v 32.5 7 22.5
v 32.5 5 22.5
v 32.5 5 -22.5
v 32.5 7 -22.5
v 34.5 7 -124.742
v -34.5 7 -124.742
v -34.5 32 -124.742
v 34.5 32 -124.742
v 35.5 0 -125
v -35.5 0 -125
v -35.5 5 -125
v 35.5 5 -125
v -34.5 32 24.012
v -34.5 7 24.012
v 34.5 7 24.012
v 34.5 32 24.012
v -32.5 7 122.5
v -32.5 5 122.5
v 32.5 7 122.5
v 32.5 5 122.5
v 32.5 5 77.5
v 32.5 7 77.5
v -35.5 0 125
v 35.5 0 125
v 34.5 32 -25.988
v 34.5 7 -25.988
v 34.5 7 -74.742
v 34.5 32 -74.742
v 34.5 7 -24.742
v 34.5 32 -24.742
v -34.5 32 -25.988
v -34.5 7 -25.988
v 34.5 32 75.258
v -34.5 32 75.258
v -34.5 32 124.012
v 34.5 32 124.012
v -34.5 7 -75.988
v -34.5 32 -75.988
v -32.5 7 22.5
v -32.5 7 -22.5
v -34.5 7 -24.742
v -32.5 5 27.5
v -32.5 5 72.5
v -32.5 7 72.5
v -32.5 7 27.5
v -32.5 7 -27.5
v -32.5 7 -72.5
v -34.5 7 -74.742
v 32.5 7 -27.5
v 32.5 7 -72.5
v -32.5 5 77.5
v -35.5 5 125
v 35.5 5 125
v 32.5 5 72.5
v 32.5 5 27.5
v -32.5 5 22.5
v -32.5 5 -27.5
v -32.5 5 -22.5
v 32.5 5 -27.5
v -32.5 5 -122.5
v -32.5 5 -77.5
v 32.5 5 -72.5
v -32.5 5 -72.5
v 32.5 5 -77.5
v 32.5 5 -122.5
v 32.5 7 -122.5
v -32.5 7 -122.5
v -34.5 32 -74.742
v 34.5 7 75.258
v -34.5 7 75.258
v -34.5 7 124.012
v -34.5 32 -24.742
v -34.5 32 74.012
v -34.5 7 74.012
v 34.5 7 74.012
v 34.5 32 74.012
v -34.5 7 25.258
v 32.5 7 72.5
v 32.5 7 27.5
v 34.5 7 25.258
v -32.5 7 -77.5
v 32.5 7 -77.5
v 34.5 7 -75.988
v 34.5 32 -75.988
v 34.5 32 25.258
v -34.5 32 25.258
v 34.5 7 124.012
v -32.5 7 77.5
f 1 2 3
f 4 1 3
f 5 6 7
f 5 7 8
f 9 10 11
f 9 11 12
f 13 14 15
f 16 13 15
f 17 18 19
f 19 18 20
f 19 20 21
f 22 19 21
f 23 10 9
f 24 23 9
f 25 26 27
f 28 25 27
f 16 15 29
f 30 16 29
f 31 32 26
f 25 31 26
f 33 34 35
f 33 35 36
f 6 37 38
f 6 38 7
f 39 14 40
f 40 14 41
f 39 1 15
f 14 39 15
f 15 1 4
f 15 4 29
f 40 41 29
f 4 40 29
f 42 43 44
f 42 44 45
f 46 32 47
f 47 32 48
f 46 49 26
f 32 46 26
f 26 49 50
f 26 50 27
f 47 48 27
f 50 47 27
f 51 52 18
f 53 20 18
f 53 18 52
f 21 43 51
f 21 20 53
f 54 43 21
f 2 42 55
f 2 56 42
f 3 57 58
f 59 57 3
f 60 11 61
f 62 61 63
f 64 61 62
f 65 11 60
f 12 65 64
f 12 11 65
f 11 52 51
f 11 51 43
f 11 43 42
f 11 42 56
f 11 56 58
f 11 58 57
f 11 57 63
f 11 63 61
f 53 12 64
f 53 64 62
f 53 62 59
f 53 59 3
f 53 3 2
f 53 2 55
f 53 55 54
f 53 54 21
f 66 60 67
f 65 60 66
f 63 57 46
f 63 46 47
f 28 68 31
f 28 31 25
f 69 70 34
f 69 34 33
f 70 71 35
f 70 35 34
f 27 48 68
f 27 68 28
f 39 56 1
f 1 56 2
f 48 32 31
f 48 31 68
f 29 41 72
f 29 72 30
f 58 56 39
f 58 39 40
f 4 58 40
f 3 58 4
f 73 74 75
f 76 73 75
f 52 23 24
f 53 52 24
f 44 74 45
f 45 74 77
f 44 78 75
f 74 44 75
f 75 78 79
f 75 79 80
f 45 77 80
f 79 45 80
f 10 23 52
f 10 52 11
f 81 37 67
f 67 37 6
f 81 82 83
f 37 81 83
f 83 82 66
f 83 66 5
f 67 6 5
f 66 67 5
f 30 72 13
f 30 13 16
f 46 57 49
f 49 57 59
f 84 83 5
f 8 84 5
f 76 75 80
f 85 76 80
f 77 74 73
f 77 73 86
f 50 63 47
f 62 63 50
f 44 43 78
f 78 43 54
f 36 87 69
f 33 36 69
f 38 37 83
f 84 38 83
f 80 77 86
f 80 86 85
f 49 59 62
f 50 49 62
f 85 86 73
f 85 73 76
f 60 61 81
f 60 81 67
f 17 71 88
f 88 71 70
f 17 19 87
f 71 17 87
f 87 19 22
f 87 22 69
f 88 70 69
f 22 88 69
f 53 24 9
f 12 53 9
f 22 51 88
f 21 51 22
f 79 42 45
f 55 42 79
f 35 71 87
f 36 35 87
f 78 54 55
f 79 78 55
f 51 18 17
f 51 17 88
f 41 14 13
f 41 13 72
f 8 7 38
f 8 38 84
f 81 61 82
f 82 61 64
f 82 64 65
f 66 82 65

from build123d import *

# Parameters (mm, degrees)
SKETCH1_W           = 71
SKETCH1_H           = 250
BOSS_EXTRUDE1_DEPTH = 5
SKETCH2_W           = 65
SKETCH2_H           = 45
BOSS_EXTRUDE3_DEPTH = 2
LPATTERN1_COUNT     = 5
LPATTERN1_PITCH     = 50
SKETCH3_W           = 69
SKETCH3_H           = 48.754858224
BOSS_EXTRUDE8_DEPTH = 25
LPATTERN5_COUNT     = 5
LPATTERN5_PITCH     = 50


with BuildPart() as part:
    # Sketch1 → Boss-Extrude1 (new body)
    with BuildSketch(Plane(origin=(0, 0, 0), x_dir=(1, 0, 0), z_dir=(0, 1, 0))):
        Rectangle(SKETCH1_W, SKETCH1_H)
    extrude(amount=BOSS_EXTRUDE1_DEPTH)

    # Sketch2 → Boss-Extrude3 (add)
    with BuildSketch(Plane(origin=(0, 5, 0), x_dir=(1, 0, 0), z_dir=(0, 1, 0))):
        with Locations((0, -100)):
            Rectangle(SKETCH2_W, SKETCH2_H)
    boss_extrude3 = extrude(amount=BOSS_EXTRUDE3_DEPTH)

    # LPattern1: Boss-Extrude3 ×5
    with Locations(*[(0, 0, -i * LPATTERN1_PITCH) for i in range(1, LPATTERN1_COUNT)]):
        add(boss_extrude3)

    # Sketch3 → Boss-Extrude8 (add)
    with BuildSketch(Plane(origin=(0, 7, 0), x_dir=(1, 0, 0), z_dir=(0, 1, 0))):
        with Locations((0, -99.635002086)):
            Rectangle(SKETCH3_W, SKETCH3_H)
    boss_extrude8 = extrude(amount=BOSS_EXTRUDE8_DEPTH)

    # LPattern5: Boss-Extrude8 ×5
    with Locations(*[(0, 0, -i * LPATTERN5_PITCH) for i in range(1, LPATTERN5_COUNT)]):
        add(boss_extrude8)


solid = part.part
